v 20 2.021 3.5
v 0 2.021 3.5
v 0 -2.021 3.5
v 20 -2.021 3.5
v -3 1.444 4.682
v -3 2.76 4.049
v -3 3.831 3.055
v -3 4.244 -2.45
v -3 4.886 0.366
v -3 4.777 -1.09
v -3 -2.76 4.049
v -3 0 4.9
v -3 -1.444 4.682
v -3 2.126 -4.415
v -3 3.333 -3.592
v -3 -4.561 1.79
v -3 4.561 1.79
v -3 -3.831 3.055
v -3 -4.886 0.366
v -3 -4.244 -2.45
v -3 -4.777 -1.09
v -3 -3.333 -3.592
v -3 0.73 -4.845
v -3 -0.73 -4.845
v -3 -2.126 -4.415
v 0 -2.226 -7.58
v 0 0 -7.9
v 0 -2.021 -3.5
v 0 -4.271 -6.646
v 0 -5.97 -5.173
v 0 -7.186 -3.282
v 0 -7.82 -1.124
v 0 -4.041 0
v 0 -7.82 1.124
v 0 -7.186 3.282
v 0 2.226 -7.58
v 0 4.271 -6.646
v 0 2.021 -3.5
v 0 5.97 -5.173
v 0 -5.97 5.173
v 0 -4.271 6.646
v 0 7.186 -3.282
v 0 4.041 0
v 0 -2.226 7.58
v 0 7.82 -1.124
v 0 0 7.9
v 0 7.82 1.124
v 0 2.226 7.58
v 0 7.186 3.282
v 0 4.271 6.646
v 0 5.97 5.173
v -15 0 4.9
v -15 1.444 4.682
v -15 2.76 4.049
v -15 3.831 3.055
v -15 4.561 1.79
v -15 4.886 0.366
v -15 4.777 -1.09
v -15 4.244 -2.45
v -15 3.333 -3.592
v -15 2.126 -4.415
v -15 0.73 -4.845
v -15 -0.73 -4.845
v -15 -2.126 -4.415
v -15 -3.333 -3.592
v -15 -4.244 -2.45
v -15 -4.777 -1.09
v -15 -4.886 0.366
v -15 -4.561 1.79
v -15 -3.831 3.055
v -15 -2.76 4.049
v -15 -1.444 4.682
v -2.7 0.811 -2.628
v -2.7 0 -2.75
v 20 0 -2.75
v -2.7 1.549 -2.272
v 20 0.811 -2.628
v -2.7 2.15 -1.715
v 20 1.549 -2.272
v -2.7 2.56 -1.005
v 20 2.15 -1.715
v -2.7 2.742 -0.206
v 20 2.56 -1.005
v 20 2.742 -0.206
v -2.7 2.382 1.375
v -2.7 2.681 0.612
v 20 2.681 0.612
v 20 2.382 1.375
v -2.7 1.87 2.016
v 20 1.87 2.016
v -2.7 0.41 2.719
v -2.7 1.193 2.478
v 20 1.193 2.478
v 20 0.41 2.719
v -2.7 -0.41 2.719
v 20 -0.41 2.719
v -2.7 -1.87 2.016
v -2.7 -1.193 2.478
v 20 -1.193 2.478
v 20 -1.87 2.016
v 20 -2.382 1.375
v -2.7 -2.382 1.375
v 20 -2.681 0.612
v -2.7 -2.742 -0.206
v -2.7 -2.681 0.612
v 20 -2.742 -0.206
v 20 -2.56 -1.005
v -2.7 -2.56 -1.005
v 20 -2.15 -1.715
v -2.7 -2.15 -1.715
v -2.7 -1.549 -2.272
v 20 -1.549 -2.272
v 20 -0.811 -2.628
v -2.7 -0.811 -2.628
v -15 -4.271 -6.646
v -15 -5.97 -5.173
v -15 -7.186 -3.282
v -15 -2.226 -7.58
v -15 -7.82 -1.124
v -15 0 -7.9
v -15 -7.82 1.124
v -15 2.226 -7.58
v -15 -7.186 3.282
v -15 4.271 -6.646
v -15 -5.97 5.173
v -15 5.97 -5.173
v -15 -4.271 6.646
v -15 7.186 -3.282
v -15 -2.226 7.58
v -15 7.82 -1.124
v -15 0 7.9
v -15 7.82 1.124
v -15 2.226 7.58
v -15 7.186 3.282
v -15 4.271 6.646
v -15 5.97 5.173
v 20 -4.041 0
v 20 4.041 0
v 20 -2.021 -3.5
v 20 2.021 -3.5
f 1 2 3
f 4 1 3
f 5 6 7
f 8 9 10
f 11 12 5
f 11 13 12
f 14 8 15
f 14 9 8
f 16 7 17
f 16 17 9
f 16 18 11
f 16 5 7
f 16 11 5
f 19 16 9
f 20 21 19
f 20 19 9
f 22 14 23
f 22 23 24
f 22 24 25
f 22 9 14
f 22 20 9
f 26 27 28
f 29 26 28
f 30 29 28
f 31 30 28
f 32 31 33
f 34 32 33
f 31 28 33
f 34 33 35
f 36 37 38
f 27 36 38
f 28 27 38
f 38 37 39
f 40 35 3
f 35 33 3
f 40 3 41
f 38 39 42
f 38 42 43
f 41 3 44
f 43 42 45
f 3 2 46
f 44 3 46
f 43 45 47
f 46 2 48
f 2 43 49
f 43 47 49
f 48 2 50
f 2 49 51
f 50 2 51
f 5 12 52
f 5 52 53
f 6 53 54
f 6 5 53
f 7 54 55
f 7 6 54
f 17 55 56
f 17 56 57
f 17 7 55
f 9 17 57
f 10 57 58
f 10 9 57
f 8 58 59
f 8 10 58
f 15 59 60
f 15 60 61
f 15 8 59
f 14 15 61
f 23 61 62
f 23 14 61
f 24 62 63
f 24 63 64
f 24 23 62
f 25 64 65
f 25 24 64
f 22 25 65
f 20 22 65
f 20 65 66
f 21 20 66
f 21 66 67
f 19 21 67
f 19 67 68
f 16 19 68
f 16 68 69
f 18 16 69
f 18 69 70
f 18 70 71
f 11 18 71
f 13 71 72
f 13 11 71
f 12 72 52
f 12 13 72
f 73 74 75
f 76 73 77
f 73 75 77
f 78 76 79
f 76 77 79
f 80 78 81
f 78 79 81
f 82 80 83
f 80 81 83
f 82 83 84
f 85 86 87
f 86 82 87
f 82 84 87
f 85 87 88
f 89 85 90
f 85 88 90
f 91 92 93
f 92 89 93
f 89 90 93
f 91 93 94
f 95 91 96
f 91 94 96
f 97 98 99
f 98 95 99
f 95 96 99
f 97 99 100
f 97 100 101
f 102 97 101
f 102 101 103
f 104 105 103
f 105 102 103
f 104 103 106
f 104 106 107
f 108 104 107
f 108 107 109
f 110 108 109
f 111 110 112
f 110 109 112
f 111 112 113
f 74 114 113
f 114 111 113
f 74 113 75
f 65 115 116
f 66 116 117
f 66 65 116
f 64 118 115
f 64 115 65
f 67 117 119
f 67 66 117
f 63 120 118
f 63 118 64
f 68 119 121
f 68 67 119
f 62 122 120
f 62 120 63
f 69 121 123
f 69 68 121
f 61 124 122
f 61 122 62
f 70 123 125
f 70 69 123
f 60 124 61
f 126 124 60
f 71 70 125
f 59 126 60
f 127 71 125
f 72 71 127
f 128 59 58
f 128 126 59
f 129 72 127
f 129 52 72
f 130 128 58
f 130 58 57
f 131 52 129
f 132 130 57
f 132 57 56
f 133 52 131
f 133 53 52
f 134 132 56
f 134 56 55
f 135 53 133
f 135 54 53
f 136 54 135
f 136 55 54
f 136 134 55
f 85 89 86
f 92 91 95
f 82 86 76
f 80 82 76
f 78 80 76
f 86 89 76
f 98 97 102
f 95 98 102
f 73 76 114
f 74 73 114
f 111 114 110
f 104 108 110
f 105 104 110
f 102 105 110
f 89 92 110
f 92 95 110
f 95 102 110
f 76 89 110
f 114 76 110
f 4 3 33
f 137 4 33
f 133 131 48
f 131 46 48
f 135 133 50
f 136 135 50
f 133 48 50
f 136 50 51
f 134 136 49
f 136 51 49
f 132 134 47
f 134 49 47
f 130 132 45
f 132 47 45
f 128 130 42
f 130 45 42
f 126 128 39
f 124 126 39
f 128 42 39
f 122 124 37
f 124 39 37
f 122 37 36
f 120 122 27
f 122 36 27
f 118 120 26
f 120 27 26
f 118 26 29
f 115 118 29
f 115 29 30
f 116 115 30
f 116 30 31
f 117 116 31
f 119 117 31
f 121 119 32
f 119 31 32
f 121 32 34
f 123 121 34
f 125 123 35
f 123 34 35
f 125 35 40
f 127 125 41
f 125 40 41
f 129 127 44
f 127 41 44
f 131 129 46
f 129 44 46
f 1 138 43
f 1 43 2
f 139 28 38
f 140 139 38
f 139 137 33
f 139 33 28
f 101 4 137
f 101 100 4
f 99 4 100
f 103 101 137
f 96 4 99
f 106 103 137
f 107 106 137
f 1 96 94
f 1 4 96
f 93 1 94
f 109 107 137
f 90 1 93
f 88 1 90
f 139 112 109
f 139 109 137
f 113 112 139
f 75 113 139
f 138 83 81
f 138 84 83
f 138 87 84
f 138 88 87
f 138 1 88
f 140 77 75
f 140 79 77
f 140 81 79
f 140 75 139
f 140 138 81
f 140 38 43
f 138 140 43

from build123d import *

# Parameters (mm, degrees)
SALIENTE_EXTRUIR1_DEPTH = 20
CROQUIS2_R              = 7.9
CROQUIS2_R_2            = 4.9
SALIENTE_EXTRUIR2_DEPTH = 3
SALIENTE_EXTRUIR3_START = 3
CROQUIS2_3_R            = 7.9
CROQUIS2_3_R_2          = 4.9
SALIENTE_EXTRUIR3_DEPTH = 12
CROQUIS3_R              = 2.75
CORTAR_EXTRUIR1_DEPTH   = 37.73989657
CROQUIS5_R              = 2.75
SALIENTE_EXTRUIR4_DEPTH = 0.3


with BuildPart() as part:
    # Croquis1 → Saliente-Extruir1 (new body)
    with BuildSketch(Plane(origin=(0, 0, 0), x_dir=(0, 0, -1), z_dir=(1, 0, 0))):
        Polygon((-3.5, -2.020725942), (0, -4.041451884), (3.5, -2.020725942), (3.5, 2.020725942), (0, 4.041451884), (-3.5, 2.020725942), align=None)
    extrude(amount=SALIENTE_EXTRUIR1_DEPTH)

    # Croquis2 → Saliente-Extruir2 (add)
    with BuildSketch(Plane.ZY):
        Circle(CROQUIS2_R)
        Circle(CROQUIS2_R_2, mode=Mode.SUBTRACT)
        Circle(CROQUIS2_R_2)
        Polygon((3.5, -2.020725942), (3.5, 2.020725942), (0, 4.041451884), (-3.5, 2.020725942), (-3.5, -2.020725942), (0, -4.041451884), align=None, mode=Mode.SUBTRACT)
        Polygon((0, -4.041451884), (3.5, -2.020725942), (3.5, 2.020725942), (0, 4.041451884), (-3.5, 2.020725942), (-3.5, -2.020725942), align=None)
    extrude(amount=SALIENTE_EXTRUIR2_DEPTH)

    # Croquis2<3> → Saliente-Extruir3 (add)
    with BuildSketch(Plane.ZY.offset(SALIENTE_EXTRUIR3_START)):
        Circle(CROQUIS2_3_R)
        Circle(CROQUIS2_3_R_2, mode=Mode.SUBTRACT)
    extrude(amount=SALIENTE_EXTRUIR3_DEPTH)

    # Croquis3 → Cortar-Extruir1 (cut, through all)
    with BuildSketch(Plane(origin=(20, 0, 0), x_dir=(0, 0, -1), z_dir=(1, 0, 0))):
        Circle(CROQUIS3_R)
    extrude(amount=-CORTAR_EXTRUIR1_DEPTH, mode=Mode.SUBTRACT)

    # Croquis5 → Saliente-Extruir4 (add)
    with BuildSketch(Plane.ZY.offset(3)):
        with Locations(Location((0, 0, 0), (0, 0, 180))):
            Circle(CROQUIS5_R)
    extrude(amount=-SALIENTE_EXTRUIR4_DEPTH)


solid = part.part
